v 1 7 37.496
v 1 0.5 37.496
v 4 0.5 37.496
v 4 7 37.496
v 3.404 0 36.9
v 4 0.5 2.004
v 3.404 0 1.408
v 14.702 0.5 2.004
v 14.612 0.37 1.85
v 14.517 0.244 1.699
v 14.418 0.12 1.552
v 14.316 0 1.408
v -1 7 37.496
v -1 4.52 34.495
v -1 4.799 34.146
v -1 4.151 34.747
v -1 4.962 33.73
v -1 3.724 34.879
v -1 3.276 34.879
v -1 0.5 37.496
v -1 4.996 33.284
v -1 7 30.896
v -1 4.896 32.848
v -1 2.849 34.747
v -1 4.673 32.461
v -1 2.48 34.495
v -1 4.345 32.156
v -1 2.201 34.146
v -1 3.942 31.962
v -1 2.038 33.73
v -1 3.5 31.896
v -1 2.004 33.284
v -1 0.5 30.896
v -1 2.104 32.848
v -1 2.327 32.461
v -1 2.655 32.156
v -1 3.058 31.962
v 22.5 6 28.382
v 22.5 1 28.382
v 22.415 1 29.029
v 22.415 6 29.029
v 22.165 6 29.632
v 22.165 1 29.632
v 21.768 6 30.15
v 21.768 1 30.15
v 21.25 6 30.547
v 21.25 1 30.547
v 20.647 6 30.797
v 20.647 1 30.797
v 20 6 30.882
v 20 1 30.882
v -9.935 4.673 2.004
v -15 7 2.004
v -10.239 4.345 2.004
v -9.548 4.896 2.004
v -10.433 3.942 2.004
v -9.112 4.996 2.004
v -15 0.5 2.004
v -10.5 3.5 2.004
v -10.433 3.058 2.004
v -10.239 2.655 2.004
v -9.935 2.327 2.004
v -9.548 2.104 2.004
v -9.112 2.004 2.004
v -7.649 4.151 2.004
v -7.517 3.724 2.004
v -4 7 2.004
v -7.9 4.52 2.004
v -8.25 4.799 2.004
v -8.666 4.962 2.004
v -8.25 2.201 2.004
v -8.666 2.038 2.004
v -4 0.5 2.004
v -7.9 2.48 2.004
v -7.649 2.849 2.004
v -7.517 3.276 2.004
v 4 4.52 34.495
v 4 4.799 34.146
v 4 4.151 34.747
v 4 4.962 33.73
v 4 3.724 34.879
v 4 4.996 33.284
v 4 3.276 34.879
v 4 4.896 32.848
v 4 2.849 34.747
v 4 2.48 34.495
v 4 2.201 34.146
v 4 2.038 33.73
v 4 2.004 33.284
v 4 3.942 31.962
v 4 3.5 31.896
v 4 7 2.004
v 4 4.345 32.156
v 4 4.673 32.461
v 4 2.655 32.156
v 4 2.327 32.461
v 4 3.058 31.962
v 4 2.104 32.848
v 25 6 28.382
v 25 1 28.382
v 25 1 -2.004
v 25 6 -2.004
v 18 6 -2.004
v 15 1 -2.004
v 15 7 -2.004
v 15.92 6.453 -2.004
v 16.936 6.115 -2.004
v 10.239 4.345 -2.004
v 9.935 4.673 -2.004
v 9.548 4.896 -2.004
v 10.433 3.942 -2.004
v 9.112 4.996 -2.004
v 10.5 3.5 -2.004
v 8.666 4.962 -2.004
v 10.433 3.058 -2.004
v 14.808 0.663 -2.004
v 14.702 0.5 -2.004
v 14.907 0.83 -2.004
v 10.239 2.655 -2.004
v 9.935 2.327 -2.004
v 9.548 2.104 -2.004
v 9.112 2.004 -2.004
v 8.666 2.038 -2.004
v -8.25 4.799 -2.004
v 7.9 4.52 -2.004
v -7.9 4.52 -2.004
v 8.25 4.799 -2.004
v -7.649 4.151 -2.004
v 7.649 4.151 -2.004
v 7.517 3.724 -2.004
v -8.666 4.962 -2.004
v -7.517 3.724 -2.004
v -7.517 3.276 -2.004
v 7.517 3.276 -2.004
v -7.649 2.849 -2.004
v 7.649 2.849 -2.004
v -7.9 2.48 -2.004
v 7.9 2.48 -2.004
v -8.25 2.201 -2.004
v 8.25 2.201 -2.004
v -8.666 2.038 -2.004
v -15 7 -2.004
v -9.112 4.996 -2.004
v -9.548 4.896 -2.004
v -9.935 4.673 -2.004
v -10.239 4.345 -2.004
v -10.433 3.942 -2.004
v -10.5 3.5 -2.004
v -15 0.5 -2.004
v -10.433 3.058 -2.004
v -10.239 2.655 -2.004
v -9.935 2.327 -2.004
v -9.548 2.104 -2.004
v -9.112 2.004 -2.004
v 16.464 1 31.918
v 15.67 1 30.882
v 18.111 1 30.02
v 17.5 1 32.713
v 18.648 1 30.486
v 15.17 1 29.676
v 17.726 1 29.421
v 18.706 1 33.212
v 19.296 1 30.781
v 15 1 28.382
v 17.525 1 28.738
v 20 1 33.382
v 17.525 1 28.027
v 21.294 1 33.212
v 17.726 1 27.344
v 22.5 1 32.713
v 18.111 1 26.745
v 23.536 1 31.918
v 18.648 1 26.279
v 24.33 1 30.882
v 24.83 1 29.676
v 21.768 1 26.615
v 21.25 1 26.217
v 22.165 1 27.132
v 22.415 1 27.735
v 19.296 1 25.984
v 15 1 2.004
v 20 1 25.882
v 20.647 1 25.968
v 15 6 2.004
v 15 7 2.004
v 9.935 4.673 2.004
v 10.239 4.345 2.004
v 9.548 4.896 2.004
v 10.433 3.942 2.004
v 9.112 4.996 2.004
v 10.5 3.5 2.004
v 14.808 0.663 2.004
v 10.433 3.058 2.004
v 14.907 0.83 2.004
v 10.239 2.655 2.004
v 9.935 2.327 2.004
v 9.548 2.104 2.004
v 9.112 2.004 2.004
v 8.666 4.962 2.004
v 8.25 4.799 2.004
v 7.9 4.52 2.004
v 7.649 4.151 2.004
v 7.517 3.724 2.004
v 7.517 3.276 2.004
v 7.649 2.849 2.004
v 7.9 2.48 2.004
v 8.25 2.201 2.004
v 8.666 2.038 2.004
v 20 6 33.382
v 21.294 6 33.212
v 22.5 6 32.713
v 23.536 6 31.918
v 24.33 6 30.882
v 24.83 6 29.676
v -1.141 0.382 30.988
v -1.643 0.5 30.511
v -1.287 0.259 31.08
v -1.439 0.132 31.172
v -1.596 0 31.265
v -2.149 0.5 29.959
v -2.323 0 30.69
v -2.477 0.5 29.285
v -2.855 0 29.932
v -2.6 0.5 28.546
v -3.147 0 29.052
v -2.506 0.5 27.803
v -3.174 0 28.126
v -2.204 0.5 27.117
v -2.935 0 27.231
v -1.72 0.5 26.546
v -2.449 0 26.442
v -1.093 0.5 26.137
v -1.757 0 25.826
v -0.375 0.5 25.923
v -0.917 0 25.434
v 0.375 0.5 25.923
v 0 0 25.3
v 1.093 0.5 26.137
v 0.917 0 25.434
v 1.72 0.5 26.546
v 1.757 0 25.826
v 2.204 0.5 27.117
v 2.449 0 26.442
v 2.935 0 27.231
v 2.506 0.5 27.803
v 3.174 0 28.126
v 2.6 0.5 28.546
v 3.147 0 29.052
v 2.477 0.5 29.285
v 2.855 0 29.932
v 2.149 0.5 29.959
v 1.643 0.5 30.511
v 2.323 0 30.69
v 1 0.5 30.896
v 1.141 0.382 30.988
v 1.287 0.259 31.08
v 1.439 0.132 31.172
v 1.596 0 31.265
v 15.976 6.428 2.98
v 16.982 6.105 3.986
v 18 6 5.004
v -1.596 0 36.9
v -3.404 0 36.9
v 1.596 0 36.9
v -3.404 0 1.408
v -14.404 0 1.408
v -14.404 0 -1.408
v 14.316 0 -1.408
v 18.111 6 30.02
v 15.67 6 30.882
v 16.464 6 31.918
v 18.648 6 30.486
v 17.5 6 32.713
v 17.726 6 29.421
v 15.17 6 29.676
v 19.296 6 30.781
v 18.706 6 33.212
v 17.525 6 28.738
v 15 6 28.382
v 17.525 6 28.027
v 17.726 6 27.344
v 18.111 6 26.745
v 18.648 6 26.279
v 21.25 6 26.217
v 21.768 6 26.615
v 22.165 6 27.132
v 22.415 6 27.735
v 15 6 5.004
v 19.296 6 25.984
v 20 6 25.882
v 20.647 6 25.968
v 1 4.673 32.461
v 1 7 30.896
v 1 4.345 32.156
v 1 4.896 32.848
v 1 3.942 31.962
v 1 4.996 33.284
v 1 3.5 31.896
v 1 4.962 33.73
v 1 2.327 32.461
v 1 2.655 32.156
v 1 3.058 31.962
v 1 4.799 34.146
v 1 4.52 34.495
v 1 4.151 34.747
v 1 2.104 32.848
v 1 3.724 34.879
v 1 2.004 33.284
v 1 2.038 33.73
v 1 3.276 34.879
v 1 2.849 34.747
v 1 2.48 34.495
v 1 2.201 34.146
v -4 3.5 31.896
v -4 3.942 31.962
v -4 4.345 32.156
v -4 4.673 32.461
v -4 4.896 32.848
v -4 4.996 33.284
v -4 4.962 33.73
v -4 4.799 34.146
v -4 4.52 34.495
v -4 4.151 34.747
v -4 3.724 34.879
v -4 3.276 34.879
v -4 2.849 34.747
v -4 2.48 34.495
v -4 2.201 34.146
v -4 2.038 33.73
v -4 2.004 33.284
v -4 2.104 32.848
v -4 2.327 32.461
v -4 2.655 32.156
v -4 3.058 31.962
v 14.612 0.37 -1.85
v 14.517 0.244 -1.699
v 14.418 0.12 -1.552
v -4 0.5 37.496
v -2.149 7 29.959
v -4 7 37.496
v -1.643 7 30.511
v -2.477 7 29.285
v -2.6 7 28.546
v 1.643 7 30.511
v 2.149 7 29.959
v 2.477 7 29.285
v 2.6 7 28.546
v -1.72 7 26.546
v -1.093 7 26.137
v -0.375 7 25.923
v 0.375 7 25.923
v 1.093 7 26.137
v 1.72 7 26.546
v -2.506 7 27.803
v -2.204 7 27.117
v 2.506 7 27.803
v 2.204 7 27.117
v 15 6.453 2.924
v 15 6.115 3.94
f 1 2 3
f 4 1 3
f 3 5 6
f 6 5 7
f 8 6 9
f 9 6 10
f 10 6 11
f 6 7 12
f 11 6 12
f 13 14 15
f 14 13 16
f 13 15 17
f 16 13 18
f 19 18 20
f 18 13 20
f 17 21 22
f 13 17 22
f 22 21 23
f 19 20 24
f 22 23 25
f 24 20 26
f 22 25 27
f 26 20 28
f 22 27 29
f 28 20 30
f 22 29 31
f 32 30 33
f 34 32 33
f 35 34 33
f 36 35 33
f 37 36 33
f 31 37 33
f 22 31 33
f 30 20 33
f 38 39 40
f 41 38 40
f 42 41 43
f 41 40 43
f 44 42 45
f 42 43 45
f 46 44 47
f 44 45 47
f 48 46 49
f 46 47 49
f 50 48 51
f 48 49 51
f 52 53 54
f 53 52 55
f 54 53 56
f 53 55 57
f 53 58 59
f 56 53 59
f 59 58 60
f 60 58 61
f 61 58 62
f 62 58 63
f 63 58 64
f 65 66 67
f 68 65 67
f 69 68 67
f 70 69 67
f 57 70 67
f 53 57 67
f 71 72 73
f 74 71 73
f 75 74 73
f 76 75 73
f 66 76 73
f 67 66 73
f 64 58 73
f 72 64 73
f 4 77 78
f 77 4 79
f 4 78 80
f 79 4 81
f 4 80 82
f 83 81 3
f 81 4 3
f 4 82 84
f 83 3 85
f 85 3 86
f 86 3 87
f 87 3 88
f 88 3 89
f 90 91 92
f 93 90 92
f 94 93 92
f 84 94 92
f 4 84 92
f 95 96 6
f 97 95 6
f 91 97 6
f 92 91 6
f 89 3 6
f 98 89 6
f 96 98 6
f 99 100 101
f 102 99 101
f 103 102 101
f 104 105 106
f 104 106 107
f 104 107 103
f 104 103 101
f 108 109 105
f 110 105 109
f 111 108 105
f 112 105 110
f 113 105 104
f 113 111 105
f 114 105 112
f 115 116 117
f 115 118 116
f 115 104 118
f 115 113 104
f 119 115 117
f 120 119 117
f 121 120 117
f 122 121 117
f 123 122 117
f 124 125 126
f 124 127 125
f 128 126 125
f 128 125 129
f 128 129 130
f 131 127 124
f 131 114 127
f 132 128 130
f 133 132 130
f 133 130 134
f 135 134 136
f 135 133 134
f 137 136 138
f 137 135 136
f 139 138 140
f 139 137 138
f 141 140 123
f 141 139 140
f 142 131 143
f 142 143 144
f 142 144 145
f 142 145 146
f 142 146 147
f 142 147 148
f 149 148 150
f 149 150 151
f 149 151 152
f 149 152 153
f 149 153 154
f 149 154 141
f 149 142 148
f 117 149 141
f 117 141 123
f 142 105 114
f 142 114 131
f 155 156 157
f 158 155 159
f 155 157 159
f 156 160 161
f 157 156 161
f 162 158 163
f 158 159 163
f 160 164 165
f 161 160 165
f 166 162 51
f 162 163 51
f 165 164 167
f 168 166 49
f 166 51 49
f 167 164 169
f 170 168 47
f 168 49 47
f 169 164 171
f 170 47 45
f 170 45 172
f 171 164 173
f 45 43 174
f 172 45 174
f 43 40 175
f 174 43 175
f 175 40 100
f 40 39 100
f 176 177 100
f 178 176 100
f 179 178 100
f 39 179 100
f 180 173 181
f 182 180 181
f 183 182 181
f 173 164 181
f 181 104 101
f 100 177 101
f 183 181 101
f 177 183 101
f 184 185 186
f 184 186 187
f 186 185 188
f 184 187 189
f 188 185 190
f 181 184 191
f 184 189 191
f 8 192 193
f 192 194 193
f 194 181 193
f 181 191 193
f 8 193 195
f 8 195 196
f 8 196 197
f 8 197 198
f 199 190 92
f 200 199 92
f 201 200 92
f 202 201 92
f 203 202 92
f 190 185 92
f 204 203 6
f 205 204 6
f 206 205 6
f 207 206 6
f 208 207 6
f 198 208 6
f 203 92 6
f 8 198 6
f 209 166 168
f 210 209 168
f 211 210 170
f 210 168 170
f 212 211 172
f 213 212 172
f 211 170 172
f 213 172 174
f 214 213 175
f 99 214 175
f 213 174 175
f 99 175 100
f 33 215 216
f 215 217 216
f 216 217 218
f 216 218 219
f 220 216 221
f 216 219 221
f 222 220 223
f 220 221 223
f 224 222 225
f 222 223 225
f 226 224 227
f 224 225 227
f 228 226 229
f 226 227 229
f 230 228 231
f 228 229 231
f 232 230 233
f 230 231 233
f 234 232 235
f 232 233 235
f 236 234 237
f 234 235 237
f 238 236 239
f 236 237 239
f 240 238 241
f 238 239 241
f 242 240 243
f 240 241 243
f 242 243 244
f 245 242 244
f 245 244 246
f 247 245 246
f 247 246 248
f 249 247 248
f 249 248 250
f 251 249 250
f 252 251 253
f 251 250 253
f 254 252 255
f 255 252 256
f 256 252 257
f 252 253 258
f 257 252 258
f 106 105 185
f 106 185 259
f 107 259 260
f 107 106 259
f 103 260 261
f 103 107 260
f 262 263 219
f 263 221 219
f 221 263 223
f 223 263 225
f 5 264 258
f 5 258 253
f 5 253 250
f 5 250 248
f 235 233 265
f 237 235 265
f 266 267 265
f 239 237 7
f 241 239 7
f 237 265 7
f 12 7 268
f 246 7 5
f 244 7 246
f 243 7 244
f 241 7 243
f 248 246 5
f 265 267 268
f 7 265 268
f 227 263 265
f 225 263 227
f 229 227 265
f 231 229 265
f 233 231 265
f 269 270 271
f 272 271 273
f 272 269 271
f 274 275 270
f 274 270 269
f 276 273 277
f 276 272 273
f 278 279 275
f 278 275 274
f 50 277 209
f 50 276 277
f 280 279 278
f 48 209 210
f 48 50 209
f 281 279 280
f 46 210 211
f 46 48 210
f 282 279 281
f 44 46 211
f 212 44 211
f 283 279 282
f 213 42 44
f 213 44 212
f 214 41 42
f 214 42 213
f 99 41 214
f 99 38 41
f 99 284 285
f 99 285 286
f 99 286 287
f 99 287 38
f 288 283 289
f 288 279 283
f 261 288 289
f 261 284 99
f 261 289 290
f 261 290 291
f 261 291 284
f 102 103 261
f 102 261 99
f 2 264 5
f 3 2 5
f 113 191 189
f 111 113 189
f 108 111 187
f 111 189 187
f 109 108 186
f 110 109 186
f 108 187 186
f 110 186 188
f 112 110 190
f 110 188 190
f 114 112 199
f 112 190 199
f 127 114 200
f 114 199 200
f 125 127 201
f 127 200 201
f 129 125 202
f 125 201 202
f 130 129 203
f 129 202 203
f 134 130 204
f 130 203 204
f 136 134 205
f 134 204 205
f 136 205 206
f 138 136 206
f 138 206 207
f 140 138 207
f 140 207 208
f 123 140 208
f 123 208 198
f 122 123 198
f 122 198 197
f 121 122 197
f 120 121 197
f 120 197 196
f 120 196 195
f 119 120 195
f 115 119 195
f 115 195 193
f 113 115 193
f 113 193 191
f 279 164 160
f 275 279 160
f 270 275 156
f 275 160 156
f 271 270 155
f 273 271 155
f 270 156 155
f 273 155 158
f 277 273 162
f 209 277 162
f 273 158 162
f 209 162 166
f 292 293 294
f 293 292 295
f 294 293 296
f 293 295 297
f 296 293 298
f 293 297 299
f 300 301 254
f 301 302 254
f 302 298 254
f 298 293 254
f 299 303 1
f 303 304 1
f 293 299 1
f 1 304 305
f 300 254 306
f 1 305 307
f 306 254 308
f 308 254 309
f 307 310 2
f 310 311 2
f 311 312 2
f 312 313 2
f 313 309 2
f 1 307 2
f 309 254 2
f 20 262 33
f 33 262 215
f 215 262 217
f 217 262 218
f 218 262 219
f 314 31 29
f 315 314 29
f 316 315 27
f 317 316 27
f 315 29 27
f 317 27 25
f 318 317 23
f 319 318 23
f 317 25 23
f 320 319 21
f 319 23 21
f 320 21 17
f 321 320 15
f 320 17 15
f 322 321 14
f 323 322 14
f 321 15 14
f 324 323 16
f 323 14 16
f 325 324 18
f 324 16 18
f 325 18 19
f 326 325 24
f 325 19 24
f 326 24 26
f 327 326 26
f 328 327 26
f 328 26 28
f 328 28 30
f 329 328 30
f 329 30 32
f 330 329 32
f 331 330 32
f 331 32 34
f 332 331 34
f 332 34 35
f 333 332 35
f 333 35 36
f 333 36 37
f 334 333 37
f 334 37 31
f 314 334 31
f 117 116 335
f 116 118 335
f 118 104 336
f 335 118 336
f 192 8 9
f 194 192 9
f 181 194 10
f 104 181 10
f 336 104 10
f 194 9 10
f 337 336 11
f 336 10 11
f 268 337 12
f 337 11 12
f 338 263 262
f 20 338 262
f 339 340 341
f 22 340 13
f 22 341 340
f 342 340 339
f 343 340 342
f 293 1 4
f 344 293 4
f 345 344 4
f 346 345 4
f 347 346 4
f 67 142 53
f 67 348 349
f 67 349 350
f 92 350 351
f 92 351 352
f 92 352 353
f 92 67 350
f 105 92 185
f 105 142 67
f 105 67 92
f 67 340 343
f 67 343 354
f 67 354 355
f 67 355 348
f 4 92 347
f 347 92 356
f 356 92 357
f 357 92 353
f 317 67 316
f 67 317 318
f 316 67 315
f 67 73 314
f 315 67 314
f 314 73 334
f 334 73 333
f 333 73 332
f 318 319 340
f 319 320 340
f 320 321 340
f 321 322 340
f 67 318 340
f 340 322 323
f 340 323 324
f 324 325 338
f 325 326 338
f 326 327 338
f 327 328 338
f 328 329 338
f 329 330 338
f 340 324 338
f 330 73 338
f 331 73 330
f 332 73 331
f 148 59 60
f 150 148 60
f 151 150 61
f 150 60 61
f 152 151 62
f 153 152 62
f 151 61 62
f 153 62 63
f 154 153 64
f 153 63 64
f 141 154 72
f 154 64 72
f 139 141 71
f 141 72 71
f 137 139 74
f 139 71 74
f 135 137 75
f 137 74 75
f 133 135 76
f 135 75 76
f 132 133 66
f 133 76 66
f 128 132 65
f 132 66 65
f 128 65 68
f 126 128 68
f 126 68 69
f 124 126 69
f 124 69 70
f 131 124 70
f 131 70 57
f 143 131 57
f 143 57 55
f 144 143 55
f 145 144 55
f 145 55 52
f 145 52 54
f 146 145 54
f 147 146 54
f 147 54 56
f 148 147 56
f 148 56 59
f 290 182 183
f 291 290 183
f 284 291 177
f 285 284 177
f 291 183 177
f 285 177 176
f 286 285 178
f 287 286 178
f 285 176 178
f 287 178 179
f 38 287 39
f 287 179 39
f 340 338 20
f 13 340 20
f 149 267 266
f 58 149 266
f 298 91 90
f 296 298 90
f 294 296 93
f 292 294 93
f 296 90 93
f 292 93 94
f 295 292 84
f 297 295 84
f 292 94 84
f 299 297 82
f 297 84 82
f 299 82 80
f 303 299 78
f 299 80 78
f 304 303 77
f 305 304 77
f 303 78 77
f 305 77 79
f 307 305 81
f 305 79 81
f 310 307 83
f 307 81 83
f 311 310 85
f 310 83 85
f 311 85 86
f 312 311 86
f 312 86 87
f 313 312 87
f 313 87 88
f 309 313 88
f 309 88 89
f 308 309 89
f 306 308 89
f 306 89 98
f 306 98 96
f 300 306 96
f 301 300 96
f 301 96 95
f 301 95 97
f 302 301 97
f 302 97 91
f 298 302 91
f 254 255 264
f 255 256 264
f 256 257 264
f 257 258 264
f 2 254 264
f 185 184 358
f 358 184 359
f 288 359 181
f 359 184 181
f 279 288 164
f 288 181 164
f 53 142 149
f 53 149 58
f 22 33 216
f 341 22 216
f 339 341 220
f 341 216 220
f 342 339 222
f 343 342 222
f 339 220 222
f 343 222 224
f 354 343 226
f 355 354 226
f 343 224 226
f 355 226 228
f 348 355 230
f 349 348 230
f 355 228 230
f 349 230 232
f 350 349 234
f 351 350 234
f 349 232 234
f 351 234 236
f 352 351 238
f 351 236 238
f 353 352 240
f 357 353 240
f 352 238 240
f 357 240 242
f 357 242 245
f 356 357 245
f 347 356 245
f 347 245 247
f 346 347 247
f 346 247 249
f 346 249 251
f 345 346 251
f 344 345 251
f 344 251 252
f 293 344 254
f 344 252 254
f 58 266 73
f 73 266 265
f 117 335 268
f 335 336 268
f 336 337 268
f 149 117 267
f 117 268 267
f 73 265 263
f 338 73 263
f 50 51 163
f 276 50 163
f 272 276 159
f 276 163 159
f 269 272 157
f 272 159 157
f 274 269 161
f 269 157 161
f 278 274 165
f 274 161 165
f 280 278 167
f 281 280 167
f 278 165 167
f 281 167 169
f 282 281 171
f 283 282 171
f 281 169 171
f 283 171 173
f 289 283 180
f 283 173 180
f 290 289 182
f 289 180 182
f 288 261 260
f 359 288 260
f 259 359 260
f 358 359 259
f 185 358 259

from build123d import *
from OCP.BRepFilletAPI import BRepFilletAPI_MakeChamfer

# Parameters (mm, degrees)
BOSS_EXTRUDE1_DEPTH      = 7
SKETCH2_R                = 1.5
CUT_EXTRUDE1_DEPTH       = 43.613787576
SKETCH3_R                = 1.5
CUT_EXTRUDE2_DEPTH       = 5
CHAMFER1_SIZE            = 0.5
CHAMFER1_SIZE2           = 0.595876796
BOSS_EXTRUDE2_DEPTH      = 2.5
BOSS_EXTRUDE2_DEPTH_BACK = 2.5
FILLET1_R                = 5
FILLET2_START            = -2.004201681
FILLET2_DEPTH            = 7.008403362
FILLET2_START_2          = 15
FILLET2_2_DEPTH          = 3


with BuildPart() as part:
    # Sketch1 → Boss-Extrude1 (new body)
    with BuildSketch(Plane(origin=(0, 0, 0), x_dir=(1, 0, 0), z_dir=(0, 1, 0))):
        with BuildLine():
            Line((15, 2.004201681), (-15, 2.004201681))
            Line((-15, 2.004201681), (-15, -2.004201681))
            Line((-15, -2.004201681), (-4, -2.004201681))
            Line((-4, -2.004201681), (-4, -37.495798319))
            Line((-4, -37.495798319), (-1, -37.495798319))
            Line((-1, -37.495798319), (-1, -30.895798319))
            ThreePointArc((-1, -30.895798319), (0, -25.895798319), (1, -30.895798319))
            Line((1, -30.895798319), (1, -37.495798319))
            Line((1, -37.495798319), (4, -37.495798319))
            Line((4, -37.495798319), (4, -2.004201681))
            Line((4, -2.004201681), (15, -2.004201681))
            Line((15, -2.004201681), (15, 2.004201681))
        make_face()
    extrude(amount=BOSS_EXTRUDE1_DEPTH)

    # Sketch2 → Cut-Extrude1 (cut, through all)
    with BuildSketch(Plane(origin=(4, 0, 0), x_dir=(0, 0, -1), z_dir=(1, 0, 0))):
        with Locations((-33.395798319, 3.5)):
            Circle(SKETCH2_R)
    extrude(amount=-CUT_EXTRUDE1_DEPTH, mode=Mode.SUBTRACT)

    # Sketch3 → Cut-Extrude2 (cut)
    with BuildSketch(Plane.XY.offset(2.004201681)):
        with Locations((9, 3.5)):
            Circle(SKETCH3_R)
        with Locations(Location((-9, 3.5, 0), (0, 0, 180))):
            Circle(SKETCH3_R)
    extrude(amount=-CUT_EXTRUDE2_DEPTH, mode=Mode.SUBTRACT)

    # Chamfer1: one chamfer whose edges measure the first distance from different faces: ONE call of the kernel's chamfer builder (chamfer() names one face for all edges)
    chamfer1_edges_1 = [part.edges().sort_by_distance(p)[0] for p in [
        (-1, 0, 34.195798319),
    ]]
    chamfer1_side_1 = [part.faces().sort_by_distance(p)[0] for p in [
        (-1, 3.5, 37.399590212),
    ]]
    chamfer1_edges_2 = [part.edges().sort_by_distance(p)[0] for p in [
        (-2.5, 0, 37.495798319),
    ]]
    chamfer1_side_2 = [part.faces().sort_by_distance(p)[0] for p in [
        (-2.5, 3.5, 37.495798319),
    ]]
    chamfer1_edges_3 = [part.edges().sort_by_distance(p)[0] for p in [
        (-4, 0, 19.75),
    ]]
    chamfer1_side_3 = [part.faces().sort_by_distance(p)[0] for p in [
        (-4, 3.5, 19.350383526),
    ]]
    chamfer1_edges_4 = [part.edges().sort_by_distance(p)[0] for p in [
        (-9.5, 0, 2.004201681),
    ]]
    chamfer1_side_4 = [part.faces().sort_by_distance(p)[0] for p in [
        (-14.869615952, 3.5, 2.004201681),
    ]]
    chamfer1_edges_5 = [part.edges().sort_by_distance(p)[0] for p in [
        (-15, 0, 0),
    ]]
    chamfer1_side_5 = [part.faces().sort_by_distance(p)[0] for p in [
        (-15, 3.5, 0),
    ]]
    chamfer1_edges_6 = [part.edges().sort_by_distance(p)[0] for p in [
        (0, 0, -2.004201681),
    ]]
    chamfer1_side_6 = [part.faces().sort_by_distance(p)[0] for p in [
        (0, 3.5, -2.004201681),
    ]]
    chamfer1_edges_7 = [part.edges().sort_by_distance(p)[0] for p in [
        (15, 0, 0),
    ]]
    chamfer1_side_7 = [part.faces().sort_by_distance(p)[0] for p in [
        (15, 3.5, 0),
    ]]
    chamfer1_edges_8 = [part.edges().sort_by_distance(p)[0] for p in [
        (9.5, 0, 2.004201681),
    ]]
    chamfer1_side_8 = [part.faces().sort_by_distance(p)[0] for p in [
        (4.130384048, 3.5, 2.004201681),
    ]]
    chamfer1_edges_9 = [part.edges().sort_by_distance(p)[0] for p in [
        (4, 0, 19.75),
    ]]
    chamfer1_side_9 = [part.faces().sort_by_distance(p)[0] for p in [
        (4, 3.5, 19.350383526),
    ]]
    chamfer1_edges_10 = [part.edges().sort_by_distance(p)[0] for p in [
        (2.5, 0, 37.495798319),
    ]]
    chamfer1_side_10 = [part.faces().sort_by_distance(p)[0] for p in [
        (2.5, 3.5, 37.495798319),
    ]]
    chamfer1_edges_11 = [part.edges().sort_by_distance(p)[0] for p in [
        (1, 0, 34.195798319),
    ]]
    chamfer1_side_11 = [part.faces().sort_by_distance(p)[0] for p in [
        (1, 3.5, 30.992006427),
    ]]
    chamfer1_edges_12 = [part.edges().sort_by_distance(p)[0] for p in [
        (0, 0, 25.895798319),
    ]]
    chamfer1_side_12 = [part.faces().sort_by_distance(p)[0] for p in [
        (0, 3.5, 25.895798319),
    ]]
    chamfer1 = BRepFilletAPI_MakeChamfer(part.part.solid().wrapped)
    for e in chamfer1_edges_1:
        chamfer1.Add(CHAMFER1_SIZE, CHAMFER1_SIZE2, e.wrapped, chamfer1_side_1[0].wrapped)  # the first distance lies on this face
    for e in chamfer1_edges_2:
        chamfer1.Add(CHAMFER1_SIZE, CHAMFER1_SIZE2, e.wrapped, chamfer1_side_2[0].wrapped)  # the first distance lies on this face
    for e in chamfer1_edges_3:
        chamfer1.Add(CHAMFER1_SIZE, CHAMFER1_SIZE2, e.wrapped, chamfer1_side_3[0].wrapped)  # the first distance lies on this face
    for e in chamfer1_edges_4:
        chamfer1.Add(CHAMFER1_SIZE, CHAMFER1_SIZE2, e.wrapped, chamfer1_side_4[0].wrapped)  # the first distance lies on this face
    for e in chamfer1_edges_5:
        chamfer1.Add(CHAMFER1_SIZE, CHAMFER1_SIZE2, e.wrapped, chamfer1_side_5[0].wrapped)  # the first distance lies on this face
    for e in chamfer1_edges_6:
        chamfer1.Add(CHAMFER1_SIZE, CHAMFER1_SIZE2, e.wrapped, chamfer1_side_6[0].wrapped)  # the first distance lies on this face
    for e in chamfer1_edges_7:
        chamfer1.Add(CHAMFER1_SIZE, CHAMFER1_SIZE2, e.wrapped, chamfer1_side_7[0].wrapped)  # the first distance lies on this face
    for e in chamfer1_edges_8:
        chamfer1.Add(CHAMFER1_SIZE, CHAMFER1_SIZE2, e.wrapped, chamfer1_side_8[0].wrapped)  # the first distance lies on this face
    for e in chamfer1_edges_9:
        chamfer1.Add(CHAMFER1_SIZE, CHAMFER1_SIZE2, e.wrapped, chamfer1_side_9[0].wrapped)  # the first distance lies on this face
    for e in chamfer1_edges_10:
        chamfer1.Add(CHAMFER1_SIZE, CHAMFER1_SIZE2, e.wrapped, chamfer1_side_10[0].wrapped)  # the first distance lies on this face
    for e in chamfer1_edges_11:
        chamfer1.Add(CHAMFER1_SIZE, CHAMFER1_SIZE2, e.wrapped, chamfer1_side_11[0].wrapped)  # the first distance lies on this face
    for e in chamfer1_edges_12:
        chamfer1.Add(CHAMFER1_SIZE, CHAMFER1_SIZE2, e.wrapped, chamfer1_side_12[0].wrapped)  # the first distance lies on this face
    add(Compound.cast(chamfer1.Shape()), mode=Mode.REPLACE)

    # Sketch4 → Boss-Extrude2 (add, two sides: drawn at the far end of the back side and taken through both)
    with BuildSketch(Plane(origin=(0, 3.5, 0), x_dir=(1, 0, 0), z_dir=(0, 1, 0)).offset(-BOSS_EXTRUDE2_DEPTH_BACK)):
        with BuildLine():
            Line((20, -23.382400921), (20, 2.004201681))
            Line((20, 2.004201681), (15, 2.004201681))
            Line((15, 2.004201681), (15, -28.382400921))
            ThreePointArc((15, -28.382400921), (16.464466094, -24.846867015), (20, -23.382400921))
        make_face()
        with BuildLine():
            Line((25, 2.004201681), (20, 2.004201681))
            Line((20, 2.004201681), (20, -23.382400921))
            ThreePointArc((20, -23.382400921), (23.535533906, -24.846867015), (25, -28.382400921))
            Line((25, -28.382400921), (25, 2.004201681))
        make_face()
        with BuildLine():
            ThreePointArc((25, -28.382400921), (23.535533906, -24.846867015), (20, -23.382400921))
            Line((20, -23.382400921), (20, -25.882400921))
            ThreePointArc((20, -25.882400921), (21.767766953, -26.614633968), (22.5, -28.382400921))
            ThreePointArc((22.5, -28.382400921), (21.767766953, -30.150167874), (20, -30.882400921))
            Line((20, -30.882400921), (20, -33.382400921))
            ThreePointArc((20, -33.382400921), (23.535533906, -31.917934827), (25, -28.382400921))
        make_face()
        with BuildLine():
            Line((20, -25.882400921), (20, -23.382400921))
            ThreePointArc((20, -23.382400921), (16.464466094, -24.846867015), (15, -28.382400921))
            ThreePointArc((15, -28.382400921), (16.464466094, -31.917934827), (20, -33.382400921))
            Line((20, -33.382400921), (20, -30.882400921))
            ThreePointArc((20, -30.882400921), (17.5, -28.382400921), (20, -25.882400921))
        make_face()
    extrude(amount=BOSS_EXTRUDE2_DEPTH + BOSS_EXTRUDE2_DEPTH_BACK)

    # Fillet1
    # the kernel refuses this fillet: 5 mm, written as the material it adds along each edge
    with BuildSketch(Plane(origin=(15, 6, -2.004201681), x_dir=(0, 1, 0), z_dir=(0, 0, 1))) as fillet1_piece_1:
        with BuildLine():
            CenterArc((5, -3), FILLET1_R, 143.130102354, 36.869897646)
            Line((0, -3), (0, 0))
            Line((0, 0), (1, 0))
        make_face()
    extrude(amount=4.008403361)
    # the kernel refuses this fillet: 5 mm, written as the material it takes off along each edge
    with BuildSketch(Plane(origin=(15, 0.5, 5.998839323), x_dir=(-0.7660444431189789, -0.6427876096865383, 0), z_dir=(0, 0, -1))) as fillet1_2_piece_1:
        with BuildLine():
            CenterArc((1.597855057, 5), FILLET1_R, 247.427648729, 22.572351271)
            Line((-0.321393805, 0.383022222), (0, 0))
            Line((0, 0), (1.597855057, 0))
        make_face()
    extrude(amount=11.997678646, mode=Mode.SUBTRACT)

    # Fillet2: read off the stored shape, not the designer's step
    # Fillet2 outline → Fillet2 (add)
    with BuildSketch(Plane.XY.offset(FILLET2_START)):
        with BuildLine():
            ThreePointArc((18, 6), (16.41886117, 6.25658351), (15, 7))
            Line((15, 7), (15, 6))
            Line((15, 6), (18, 6))
        make_face()
    extrude(amount=FILLET2_DEPTH)

    # Fillet2 2 outline → Fillet2 2 (cut)
    with BuildSketch(Plane.YZ.offset(FILLET2_START_2)):
        with BuildLine():
            Line((9, 5.004201681), (6, 5.004201681))
            ThreePointArc((6, 5.004201681), (6.25658351, 3.423062851), (7, 2.004201681))
            Line((7, 2.004201681), (7.75315126, 1))
            Line((7.75315126, 1), (9, 1))
            Line((9, 1), (9, 5.004201681))
        make_face()
    extrude(amount=FILLET2_2_DEPTH, mode=Mode.SUBTRACT)


solid = part.part
